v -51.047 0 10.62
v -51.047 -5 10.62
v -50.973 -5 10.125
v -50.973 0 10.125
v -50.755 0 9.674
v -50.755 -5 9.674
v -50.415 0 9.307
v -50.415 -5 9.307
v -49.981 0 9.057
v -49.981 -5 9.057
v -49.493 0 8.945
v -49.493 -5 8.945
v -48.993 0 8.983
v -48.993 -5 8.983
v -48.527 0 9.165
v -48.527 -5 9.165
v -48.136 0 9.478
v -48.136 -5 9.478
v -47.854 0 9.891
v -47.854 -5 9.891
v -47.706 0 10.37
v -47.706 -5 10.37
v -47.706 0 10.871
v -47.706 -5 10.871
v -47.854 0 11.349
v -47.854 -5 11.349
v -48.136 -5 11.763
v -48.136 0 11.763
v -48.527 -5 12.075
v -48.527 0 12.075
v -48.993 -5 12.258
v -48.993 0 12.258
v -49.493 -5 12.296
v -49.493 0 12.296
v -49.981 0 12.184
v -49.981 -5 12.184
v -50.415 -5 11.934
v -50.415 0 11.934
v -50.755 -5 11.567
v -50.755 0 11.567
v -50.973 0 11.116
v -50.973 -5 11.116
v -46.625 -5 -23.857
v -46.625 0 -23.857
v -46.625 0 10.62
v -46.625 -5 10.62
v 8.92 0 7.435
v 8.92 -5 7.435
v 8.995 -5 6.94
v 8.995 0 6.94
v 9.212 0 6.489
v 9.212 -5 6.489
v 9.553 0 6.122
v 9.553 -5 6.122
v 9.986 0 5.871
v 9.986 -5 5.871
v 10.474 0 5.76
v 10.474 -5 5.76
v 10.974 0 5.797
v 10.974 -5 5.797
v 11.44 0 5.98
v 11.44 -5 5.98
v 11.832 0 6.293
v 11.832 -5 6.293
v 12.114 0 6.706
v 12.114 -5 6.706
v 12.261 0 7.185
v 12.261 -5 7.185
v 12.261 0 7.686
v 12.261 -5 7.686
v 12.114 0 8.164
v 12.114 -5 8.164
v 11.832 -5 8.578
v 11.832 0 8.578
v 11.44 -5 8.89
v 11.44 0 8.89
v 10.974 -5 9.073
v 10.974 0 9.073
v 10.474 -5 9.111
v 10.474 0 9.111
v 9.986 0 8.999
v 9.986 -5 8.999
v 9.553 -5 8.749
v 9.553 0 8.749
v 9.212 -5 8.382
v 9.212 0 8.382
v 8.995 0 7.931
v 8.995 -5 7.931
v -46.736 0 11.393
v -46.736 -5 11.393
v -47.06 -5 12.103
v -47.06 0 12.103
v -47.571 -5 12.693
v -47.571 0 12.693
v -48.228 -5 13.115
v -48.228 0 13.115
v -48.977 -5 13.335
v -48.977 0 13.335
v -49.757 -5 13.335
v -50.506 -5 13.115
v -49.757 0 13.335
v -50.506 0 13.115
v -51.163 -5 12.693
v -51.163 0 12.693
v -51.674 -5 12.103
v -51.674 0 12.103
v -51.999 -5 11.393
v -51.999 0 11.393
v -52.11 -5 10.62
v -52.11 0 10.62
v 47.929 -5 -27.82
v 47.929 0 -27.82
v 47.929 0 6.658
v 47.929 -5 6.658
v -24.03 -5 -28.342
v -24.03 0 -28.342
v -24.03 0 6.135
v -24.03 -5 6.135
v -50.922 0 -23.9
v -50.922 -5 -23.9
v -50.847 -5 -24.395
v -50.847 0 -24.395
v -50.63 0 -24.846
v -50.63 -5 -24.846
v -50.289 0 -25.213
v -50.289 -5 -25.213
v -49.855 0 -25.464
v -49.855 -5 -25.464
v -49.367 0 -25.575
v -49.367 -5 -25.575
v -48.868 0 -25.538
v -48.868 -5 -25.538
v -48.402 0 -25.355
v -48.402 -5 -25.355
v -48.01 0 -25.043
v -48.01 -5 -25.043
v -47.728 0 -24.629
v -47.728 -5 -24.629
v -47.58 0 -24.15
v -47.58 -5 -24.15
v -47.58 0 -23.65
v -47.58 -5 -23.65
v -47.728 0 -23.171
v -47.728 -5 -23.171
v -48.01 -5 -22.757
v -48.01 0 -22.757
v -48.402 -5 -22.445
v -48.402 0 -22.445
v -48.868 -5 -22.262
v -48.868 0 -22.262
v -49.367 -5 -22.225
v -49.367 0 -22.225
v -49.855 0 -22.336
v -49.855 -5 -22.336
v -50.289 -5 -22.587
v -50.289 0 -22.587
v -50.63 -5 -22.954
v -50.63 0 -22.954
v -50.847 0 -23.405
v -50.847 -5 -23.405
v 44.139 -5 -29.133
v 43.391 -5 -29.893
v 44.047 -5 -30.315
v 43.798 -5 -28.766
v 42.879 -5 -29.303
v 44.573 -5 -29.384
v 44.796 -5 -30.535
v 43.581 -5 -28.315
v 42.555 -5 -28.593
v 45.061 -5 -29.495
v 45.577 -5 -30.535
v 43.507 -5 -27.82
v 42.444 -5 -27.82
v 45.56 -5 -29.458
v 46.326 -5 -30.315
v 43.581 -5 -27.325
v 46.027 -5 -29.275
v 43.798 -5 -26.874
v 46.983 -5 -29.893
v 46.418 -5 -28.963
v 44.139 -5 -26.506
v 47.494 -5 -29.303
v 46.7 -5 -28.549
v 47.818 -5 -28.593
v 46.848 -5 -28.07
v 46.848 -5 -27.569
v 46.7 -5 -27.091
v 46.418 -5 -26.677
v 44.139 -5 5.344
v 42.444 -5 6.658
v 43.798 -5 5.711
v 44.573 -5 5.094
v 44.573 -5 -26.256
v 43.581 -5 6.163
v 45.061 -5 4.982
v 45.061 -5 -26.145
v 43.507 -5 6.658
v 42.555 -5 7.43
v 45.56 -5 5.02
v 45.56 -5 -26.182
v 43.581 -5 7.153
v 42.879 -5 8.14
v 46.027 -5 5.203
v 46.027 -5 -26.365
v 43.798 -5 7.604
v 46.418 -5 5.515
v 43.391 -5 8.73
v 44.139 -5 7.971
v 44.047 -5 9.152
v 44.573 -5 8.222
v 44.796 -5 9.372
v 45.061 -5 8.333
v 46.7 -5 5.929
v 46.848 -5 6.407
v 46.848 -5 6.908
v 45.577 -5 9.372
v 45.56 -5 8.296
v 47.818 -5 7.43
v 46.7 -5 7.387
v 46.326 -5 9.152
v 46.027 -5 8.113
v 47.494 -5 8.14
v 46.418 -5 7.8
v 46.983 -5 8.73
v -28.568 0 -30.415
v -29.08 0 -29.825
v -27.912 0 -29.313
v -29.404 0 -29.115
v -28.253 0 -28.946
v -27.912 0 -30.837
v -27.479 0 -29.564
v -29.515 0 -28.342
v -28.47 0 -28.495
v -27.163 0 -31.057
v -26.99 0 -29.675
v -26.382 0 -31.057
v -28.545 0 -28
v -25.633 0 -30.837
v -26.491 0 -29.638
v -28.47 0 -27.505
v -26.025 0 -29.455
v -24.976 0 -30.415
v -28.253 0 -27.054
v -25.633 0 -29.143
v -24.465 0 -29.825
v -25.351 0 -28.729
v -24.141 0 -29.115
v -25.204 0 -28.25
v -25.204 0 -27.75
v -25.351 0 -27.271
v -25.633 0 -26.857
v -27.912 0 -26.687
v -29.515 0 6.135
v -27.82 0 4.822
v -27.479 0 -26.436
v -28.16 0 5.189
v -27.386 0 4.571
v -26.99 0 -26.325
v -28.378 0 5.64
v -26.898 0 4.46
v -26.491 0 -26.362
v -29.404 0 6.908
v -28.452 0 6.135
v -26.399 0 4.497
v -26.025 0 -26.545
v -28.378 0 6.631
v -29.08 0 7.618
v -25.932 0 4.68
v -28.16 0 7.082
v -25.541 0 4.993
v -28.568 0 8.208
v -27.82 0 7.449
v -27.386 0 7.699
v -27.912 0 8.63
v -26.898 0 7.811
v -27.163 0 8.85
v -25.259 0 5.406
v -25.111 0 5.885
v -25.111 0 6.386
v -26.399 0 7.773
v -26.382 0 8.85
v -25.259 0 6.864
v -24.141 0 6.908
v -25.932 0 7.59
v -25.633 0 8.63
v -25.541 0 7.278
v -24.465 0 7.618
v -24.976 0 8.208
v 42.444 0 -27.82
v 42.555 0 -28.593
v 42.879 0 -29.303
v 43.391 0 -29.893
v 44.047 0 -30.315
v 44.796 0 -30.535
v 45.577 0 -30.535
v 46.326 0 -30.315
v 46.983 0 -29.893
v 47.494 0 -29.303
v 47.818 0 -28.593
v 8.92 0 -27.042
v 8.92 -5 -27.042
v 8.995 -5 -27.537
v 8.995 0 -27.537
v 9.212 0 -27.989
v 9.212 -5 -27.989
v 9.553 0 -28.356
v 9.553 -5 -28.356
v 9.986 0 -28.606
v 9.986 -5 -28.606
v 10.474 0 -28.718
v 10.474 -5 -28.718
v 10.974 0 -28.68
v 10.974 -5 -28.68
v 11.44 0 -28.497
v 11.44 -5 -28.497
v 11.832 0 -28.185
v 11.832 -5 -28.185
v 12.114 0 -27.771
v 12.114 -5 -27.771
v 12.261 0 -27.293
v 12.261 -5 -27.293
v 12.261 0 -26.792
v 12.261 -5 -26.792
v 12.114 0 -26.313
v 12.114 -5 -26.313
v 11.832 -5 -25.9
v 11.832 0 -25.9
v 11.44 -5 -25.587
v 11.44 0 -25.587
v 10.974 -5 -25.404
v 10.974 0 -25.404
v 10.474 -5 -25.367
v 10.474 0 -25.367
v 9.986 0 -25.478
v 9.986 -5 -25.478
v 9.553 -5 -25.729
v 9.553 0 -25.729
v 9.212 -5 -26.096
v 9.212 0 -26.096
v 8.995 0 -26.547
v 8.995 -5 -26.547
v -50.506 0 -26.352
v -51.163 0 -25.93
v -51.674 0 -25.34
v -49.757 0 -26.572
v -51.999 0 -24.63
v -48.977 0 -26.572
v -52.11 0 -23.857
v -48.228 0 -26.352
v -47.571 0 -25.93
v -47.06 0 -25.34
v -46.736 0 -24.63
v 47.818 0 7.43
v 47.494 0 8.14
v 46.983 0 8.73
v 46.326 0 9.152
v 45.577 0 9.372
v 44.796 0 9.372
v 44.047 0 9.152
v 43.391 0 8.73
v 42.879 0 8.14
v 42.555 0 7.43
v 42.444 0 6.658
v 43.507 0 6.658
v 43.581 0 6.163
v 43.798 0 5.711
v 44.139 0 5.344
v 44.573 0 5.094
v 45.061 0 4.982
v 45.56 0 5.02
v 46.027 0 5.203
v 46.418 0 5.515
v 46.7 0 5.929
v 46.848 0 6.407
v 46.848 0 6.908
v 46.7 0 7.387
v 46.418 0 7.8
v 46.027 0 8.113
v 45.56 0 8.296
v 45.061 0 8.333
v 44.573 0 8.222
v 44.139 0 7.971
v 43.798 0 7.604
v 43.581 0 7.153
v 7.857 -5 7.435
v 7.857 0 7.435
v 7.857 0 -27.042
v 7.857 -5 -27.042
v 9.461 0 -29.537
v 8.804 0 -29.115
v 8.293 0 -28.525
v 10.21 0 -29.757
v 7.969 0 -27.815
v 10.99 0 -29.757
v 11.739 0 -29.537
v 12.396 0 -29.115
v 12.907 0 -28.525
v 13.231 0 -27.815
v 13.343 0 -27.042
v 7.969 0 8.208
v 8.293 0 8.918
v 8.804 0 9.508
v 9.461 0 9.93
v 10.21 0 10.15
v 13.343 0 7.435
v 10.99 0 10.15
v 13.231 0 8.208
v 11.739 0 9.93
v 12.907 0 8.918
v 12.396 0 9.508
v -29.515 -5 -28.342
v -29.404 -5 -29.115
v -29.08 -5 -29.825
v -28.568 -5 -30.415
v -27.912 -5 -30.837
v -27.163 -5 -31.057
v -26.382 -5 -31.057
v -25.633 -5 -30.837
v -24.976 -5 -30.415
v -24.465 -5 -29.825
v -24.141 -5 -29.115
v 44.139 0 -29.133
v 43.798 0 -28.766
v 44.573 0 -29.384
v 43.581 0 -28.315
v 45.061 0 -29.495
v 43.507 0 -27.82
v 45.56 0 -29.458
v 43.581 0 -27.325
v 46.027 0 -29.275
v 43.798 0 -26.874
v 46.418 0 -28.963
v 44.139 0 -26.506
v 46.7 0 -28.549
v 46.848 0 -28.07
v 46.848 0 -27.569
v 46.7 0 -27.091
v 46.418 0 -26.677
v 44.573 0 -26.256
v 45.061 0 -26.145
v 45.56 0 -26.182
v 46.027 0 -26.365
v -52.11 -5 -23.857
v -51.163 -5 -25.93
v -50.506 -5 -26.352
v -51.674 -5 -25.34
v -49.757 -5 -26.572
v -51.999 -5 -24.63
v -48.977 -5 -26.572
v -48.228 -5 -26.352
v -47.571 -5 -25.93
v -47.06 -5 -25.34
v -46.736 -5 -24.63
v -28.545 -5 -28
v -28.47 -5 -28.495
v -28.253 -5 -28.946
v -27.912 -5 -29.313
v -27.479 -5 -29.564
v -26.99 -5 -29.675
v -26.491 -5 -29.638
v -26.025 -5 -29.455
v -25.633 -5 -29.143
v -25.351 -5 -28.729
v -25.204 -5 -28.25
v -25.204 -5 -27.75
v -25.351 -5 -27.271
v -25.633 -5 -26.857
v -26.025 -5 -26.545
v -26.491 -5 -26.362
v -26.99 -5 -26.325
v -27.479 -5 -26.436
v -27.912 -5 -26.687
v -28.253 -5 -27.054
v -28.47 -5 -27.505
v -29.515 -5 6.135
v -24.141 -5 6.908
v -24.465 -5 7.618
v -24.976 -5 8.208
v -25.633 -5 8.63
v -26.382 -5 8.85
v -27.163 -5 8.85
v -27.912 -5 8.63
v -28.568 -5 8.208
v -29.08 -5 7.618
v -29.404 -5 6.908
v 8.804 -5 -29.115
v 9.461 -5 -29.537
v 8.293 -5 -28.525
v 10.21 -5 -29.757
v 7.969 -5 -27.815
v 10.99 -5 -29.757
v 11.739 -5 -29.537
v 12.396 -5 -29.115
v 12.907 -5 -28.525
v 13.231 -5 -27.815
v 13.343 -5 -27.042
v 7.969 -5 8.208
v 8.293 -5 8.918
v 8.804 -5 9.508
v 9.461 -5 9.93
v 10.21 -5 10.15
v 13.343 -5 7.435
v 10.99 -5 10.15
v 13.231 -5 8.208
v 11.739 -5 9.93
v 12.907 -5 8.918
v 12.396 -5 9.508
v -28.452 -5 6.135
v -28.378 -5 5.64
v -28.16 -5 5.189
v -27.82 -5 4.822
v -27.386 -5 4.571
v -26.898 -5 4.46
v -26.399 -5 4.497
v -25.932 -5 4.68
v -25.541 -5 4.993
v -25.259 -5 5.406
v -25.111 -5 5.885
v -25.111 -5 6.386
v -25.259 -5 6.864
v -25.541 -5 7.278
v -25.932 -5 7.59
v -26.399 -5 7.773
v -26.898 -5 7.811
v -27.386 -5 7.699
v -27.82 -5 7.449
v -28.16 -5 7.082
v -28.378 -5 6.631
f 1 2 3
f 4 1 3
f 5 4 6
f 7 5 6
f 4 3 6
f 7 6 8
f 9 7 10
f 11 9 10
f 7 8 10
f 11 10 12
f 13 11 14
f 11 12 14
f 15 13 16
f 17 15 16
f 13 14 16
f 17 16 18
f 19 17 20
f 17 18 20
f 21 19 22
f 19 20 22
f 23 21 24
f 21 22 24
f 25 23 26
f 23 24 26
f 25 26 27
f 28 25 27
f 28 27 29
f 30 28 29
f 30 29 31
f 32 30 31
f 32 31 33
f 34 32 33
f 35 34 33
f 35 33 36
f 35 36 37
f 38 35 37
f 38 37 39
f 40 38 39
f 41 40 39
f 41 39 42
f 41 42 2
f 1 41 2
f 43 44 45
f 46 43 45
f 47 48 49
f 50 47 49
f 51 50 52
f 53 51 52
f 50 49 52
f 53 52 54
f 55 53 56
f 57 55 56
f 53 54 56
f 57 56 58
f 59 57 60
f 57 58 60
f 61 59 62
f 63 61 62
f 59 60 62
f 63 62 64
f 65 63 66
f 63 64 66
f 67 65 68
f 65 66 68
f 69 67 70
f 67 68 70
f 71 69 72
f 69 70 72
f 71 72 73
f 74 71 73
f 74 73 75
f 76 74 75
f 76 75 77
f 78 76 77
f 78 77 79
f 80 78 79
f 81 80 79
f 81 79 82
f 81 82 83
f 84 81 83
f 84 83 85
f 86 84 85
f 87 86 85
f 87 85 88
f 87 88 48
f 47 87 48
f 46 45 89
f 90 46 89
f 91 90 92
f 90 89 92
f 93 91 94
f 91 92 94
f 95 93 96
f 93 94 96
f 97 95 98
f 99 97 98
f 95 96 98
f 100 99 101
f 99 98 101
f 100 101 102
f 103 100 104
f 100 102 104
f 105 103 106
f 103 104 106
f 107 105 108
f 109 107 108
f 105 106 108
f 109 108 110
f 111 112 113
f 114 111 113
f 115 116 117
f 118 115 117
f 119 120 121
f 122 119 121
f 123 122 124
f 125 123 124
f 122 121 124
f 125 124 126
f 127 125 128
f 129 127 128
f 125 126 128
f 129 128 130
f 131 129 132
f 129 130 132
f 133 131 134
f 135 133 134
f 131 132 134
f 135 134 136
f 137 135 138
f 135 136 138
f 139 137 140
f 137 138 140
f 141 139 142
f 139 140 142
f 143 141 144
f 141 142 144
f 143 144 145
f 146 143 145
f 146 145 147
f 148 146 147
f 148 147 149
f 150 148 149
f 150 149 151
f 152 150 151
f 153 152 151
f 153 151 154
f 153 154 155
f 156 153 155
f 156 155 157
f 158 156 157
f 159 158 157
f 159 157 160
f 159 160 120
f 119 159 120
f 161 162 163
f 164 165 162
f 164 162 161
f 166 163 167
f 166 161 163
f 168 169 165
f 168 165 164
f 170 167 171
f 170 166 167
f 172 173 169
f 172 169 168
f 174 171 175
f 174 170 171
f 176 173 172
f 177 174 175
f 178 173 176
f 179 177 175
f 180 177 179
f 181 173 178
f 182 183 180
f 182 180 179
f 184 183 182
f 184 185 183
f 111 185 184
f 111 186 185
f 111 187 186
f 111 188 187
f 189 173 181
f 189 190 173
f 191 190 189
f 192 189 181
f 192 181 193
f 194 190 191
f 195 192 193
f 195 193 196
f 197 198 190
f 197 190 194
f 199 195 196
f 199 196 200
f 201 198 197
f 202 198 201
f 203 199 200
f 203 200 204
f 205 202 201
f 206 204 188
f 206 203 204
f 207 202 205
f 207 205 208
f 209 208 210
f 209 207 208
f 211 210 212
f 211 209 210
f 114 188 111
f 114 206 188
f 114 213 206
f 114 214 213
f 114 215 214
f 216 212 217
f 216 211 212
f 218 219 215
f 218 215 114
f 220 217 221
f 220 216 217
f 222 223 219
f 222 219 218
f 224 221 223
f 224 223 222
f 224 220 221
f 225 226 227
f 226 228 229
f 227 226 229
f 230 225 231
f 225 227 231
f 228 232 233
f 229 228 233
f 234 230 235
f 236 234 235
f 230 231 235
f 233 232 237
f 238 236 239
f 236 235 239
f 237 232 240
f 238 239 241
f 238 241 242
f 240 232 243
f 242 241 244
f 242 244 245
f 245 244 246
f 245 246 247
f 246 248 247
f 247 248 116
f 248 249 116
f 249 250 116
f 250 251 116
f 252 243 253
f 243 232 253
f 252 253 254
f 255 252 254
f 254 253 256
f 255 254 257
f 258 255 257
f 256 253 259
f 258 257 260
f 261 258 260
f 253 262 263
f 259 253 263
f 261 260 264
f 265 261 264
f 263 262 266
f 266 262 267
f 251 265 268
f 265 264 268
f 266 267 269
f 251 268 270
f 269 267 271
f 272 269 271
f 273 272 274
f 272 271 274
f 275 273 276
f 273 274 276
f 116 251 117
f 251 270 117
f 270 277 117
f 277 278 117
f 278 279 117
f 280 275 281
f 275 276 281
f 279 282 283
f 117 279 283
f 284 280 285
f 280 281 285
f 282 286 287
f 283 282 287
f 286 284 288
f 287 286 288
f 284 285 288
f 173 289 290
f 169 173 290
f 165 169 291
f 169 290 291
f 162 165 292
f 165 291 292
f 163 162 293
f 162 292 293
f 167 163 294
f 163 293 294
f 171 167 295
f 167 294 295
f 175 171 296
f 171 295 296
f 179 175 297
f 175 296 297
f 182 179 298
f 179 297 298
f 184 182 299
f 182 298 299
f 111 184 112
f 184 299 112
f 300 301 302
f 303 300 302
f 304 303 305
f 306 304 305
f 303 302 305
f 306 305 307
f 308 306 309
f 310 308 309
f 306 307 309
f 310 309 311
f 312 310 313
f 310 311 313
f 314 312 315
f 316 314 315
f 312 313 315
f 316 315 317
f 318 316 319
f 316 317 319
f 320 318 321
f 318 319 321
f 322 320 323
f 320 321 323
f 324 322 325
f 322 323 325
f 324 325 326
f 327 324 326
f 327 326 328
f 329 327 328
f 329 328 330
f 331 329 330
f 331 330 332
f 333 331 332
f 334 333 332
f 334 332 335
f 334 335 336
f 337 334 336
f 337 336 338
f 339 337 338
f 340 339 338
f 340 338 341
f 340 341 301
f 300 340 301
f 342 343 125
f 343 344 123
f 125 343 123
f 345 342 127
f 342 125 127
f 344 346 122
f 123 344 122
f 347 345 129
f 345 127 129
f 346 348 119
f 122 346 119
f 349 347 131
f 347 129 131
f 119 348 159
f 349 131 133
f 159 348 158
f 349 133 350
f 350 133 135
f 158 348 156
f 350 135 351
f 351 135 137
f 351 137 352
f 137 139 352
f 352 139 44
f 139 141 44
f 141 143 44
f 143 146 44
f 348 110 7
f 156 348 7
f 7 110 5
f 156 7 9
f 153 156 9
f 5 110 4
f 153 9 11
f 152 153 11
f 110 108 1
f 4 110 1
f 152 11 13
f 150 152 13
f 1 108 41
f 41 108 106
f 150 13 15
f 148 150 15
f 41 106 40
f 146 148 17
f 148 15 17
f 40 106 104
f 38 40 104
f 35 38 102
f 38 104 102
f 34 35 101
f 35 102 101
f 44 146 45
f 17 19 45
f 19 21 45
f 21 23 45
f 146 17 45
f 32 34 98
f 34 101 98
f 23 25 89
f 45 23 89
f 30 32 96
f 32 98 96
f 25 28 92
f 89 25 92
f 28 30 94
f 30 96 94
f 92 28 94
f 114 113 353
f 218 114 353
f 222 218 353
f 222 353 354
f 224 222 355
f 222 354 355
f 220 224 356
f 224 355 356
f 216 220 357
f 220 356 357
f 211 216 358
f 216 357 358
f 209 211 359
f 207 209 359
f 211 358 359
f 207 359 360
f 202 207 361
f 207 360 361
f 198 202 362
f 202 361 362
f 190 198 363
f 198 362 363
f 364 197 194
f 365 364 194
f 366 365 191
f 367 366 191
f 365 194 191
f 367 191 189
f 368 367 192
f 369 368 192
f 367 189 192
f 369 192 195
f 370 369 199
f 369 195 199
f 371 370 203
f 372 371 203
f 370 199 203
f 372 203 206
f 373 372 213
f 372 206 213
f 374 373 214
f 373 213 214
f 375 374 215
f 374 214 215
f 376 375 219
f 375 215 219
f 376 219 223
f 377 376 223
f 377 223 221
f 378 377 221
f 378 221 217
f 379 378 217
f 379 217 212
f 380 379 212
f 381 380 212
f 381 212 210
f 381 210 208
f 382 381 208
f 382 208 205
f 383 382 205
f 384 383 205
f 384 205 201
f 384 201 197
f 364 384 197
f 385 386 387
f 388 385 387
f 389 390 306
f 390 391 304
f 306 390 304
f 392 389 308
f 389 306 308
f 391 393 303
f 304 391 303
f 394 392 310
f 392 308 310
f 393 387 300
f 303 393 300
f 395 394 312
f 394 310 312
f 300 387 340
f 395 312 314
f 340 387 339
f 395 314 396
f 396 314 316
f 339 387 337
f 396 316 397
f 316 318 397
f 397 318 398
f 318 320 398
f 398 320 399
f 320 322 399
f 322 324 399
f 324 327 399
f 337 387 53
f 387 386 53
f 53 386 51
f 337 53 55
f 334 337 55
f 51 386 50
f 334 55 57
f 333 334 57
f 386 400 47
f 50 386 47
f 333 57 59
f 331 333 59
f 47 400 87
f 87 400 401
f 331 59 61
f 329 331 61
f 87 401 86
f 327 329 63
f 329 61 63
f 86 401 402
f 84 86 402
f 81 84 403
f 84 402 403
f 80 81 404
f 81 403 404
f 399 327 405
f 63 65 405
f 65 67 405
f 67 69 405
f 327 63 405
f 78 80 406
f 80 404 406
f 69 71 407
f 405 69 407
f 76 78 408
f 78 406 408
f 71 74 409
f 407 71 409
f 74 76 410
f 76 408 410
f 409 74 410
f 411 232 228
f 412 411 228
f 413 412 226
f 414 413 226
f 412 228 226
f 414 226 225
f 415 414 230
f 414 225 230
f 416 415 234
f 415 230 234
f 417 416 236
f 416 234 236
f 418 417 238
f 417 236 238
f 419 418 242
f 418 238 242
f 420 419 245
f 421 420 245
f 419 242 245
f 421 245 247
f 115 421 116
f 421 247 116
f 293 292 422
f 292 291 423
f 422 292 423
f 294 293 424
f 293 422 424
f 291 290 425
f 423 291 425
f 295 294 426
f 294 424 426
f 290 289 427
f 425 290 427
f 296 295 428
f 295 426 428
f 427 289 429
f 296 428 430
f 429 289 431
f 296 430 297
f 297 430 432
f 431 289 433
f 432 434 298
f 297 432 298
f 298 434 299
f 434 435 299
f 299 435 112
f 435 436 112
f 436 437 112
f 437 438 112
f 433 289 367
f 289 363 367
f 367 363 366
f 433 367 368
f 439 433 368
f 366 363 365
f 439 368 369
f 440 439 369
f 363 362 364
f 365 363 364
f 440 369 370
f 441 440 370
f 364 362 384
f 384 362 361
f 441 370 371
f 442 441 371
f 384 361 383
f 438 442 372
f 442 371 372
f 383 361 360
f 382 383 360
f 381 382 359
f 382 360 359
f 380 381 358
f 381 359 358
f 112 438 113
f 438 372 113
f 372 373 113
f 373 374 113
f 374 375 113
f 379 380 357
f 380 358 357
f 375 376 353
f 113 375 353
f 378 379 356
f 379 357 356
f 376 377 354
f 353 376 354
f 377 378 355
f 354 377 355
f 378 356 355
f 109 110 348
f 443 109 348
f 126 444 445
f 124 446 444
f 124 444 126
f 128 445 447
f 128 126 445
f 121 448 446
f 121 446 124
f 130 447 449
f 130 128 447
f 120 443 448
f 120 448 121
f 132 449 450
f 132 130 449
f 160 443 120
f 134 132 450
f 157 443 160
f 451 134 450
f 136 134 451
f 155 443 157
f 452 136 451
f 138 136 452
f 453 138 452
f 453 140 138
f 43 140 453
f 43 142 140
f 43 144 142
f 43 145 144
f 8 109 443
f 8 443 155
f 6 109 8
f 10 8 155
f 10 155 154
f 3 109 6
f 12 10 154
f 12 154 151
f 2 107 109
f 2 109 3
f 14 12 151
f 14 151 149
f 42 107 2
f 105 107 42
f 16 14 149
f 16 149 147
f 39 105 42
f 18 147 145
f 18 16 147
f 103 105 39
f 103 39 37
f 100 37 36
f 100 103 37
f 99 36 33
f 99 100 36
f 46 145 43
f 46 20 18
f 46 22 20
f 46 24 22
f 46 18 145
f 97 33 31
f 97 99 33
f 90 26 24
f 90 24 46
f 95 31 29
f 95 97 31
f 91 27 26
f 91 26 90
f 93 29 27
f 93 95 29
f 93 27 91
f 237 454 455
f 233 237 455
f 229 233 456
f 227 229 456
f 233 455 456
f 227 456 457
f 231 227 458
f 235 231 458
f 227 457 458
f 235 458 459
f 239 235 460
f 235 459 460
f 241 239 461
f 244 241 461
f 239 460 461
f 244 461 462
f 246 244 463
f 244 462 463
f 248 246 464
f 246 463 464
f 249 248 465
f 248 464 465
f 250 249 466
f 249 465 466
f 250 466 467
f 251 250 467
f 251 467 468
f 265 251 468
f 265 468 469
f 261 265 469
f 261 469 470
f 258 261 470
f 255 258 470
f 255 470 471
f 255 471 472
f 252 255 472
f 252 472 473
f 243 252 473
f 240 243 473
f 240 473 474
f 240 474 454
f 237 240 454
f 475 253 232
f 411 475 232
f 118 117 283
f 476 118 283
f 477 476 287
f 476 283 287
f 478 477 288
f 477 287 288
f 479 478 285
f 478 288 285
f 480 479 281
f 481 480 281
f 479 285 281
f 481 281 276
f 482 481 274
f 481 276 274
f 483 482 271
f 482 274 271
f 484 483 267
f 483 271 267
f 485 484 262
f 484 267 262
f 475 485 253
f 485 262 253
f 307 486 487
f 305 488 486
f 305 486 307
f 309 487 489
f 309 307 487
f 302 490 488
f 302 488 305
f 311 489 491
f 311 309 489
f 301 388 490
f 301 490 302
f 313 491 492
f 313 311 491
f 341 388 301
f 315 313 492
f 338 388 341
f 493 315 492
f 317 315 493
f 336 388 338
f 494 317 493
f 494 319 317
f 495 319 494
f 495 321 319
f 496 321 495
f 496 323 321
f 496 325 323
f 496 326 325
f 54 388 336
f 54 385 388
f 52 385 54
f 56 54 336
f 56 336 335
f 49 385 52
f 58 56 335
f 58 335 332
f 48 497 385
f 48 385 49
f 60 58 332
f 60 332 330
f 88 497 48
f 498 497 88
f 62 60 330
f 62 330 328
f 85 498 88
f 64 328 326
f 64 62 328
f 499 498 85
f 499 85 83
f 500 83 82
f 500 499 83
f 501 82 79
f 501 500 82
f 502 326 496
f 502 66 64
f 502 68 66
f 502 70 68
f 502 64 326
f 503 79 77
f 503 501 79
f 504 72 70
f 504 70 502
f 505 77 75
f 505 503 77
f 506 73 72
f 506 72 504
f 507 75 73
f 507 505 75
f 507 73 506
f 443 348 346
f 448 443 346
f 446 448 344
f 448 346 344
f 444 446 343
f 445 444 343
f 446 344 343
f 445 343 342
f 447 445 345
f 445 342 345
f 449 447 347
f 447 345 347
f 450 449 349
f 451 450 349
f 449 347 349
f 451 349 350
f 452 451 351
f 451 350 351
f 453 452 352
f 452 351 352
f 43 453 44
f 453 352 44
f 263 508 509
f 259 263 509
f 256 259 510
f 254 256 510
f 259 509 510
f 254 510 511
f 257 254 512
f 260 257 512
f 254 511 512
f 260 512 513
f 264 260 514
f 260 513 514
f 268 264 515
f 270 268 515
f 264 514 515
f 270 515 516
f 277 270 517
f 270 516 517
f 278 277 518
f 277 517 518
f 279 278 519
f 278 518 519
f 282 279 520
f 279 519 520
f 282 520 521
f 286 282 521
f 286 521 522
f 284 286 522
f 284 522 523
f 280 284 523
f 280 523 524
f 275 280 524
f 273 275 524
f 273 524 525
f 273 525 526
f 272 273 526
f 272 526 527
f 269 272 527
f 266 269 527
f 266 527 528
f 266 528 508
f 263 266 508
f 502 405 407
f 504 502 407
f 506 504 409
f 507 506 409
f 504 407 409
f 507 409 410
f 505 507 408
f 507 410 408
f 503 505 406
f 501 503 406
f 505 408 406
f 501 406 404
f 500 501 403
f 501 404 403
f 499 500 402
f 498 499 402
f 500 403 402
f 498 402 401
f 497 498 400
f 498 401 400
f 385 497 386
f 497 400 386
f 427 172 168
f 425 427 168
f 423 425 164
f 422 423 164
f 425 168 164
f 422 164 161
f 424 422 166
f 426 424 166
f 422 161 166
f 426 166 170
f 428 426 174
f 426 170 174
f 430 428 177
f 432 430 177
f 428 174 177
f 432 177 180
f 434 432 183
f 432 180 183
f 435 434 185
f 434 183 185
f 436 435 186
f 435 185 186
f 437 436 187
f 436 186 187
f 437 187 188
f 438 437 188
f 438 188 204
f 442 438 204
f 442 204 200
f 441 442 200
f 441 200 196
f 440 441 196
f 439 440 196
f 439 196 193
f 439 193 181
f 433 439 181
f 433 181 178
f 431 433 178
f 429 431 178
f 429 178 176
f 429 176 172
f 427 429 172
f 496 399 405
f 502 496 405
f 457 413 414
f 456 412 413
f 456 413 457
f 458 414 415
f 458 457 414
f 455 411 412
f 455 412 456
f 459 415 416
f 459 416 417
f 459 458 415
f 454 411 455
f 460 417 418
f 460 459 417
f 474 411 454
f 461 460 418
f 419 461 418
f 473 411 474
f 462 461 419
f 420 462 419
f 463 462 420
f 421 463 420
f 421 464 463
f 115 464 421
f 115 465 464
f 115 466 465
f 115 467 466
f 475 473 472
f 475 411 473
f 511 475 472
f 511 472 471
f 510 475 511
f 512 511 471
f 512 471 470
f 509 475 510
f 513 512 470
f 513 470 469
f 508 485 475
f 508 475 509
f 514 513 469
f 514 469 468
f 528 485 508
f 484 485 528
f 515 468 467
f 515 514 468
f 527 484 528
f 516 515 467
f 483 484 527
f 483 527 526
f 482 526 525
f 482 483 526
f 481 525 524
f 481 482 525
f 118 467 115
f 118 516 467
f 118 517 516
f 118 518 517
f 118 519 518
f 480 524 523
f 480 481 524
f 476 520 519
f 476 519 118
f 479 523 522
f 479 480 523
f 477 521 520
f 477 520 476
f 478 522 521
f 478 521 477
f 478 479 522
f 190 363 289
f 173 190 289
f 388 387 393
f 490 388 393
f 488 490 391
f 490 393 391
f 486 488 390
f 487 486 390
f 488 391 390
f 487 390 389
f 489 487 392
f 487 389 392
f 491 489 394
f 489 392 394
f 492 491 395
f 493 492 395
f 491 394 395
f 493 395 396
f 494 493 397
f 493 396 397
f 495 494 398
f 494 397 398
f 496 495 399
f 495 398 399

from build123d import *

# Parameters (mm, degrees)
F2_DEPTH     = 5
F3_DEPTH     = 5
F4_DEPTH     = 5
F5_D         = 3.36
F5_2_D       = 3.36
F5_3_D       = 3.36
F5_4_D       = 3.36
F5_ON_F1_D   = 3.36
F5_ON_F1_2_D = 3.36


with BuildPart() as f2:
    # F0 (on Front) → F2 (new body)
    with BuildSketch(Plane.XZ):
        with BuildLine():
            ThreePointArc((-24.0298556164, 6.1353398487), (-26.7723915167, 8.877875749), (-29.514927417, 6.1353398487))
            Line((-29.514927417, 6.1353398487), (-24.0298556164, 6.1353398487))
        make_face()
        with BuildLine():
            Line((-24.0298556164, 6.1353398487), (-29.514927417, 6.1353398487))
            ThreePointArc((-29.514927417, 6.1353398487), (-26.7723915167, 3.3928039484), (-24.0298556164, 6.1353398487))
        make_face()
        with BuildLine():
            ThreePointArc((-24.0298556164, 6.1353398487), (-26.7723915167, 3.3928039484), (-29.514927417, 6.1353398487))
            Line((-29.514927417, 6.1353398487), (-29.514927417, -28.3422730863))
            ThreePointArc((-29.514927417, -28.3422730863), (-26.7723915167, -25.599737186), (-24.0298556164, -28.3422730863))
            Line((-24.0298556164, -28.3422730863), (-24.0298556164, 6.1353398487))
        make_face()
        with BuildLine():
            ThreePointArc((-24.0298556164, -28.3422730863), (-26.7723915167, -25.599737186), (-29.514927417, -28.3422730863))
            Line((-29.514927417, -28.3422730863), (-24.0298556164, -28.3422730863))
        make_face()
        with BuildLine():
            Line((-24.0298556164, -28.3422730863), (-29.514927417, -28.3422730863))
            ThreePointArc((-29.514927417, -28.3422730863), (-26.7723915167, -31.0848089866), (-24.0298556164, -28.3422730863))
        make_face()
    extrude(amount=F2_DEPTH)

    # F5 (through all)
    with Locations(Plane(origin=(0, 0, 0), x_dir=(1, 0, 0), z_dir=(0, 1, 0))):
        with Locations((45.1865680516, -6.6577275284), (45.1865680516, 27.8198854066), (10.5999996886, 27.0422715694), (10.5999996886, -7.4353413656), (-26.7723915167, -6.1353398487), (-49.3671749718, -10.6204142794)):
            Hole(F5_D / 2)

    # F5 on F1 (through all)
    with Locations(Plane(origin=(0, 0, 0), x_dir=(1, 0, 0), z_dir=(0, 1, 0))):
        with Locations((-26.8647950143, 27.9999990016), (-49.2416396737, 23.8999929279)):
            Hole(F5_ON_F1_D / 2)


with BuildPart() as f3:
    # F0 (on Front) → F3 (new body)
    with BuildSketch(Plane.XZ):
        with BuildLine():
            ThreePointArc((7.8574637882, -27.0422715694), (10.5999996886, -29.7848074697), (13.3425355889, -27.0422715694))
            ThreePointArc((13.3425355889, -27.0422715694), (10.5999996886, -24.299735669), (7.8574637882, -27.0422715694))
        make_face()
        with BuildLine():
            ThreePointArc((7.8574637882, 7.4353413656), (10.5999996886, 4.6928054653), (13.3425355889, 7.4353413656))
            ThreePointArc((13.3425355889, 7.4353413656), (10.5999996886, 10.177877266), (7.8574637882, 7.4353413656))
        make_face()
        with BuildLine():
            ThreePointArc((7.8574637882, -27.0422715694), (10.5999996886, -24.299735669), (13.3425355889, -27.0422715694))
            Line((13.3425355889, -27.0422715694), (13.3425355889, 7.4353413656))
            ThreePointArc((13.3425355889, 7.4353413656), (10.5999996886, 4.6928054653), (7.8574637882, 7.4353413656))
            Line((7.8574637882, 7.4353413656), (7.8574637882, -27.0422715694))
        make_face()
    extrude(amount=F3_DEPTH)

    # F5#2 (through all)
    with Locations(Plane(origin=(0, 0, 0), x_dir=(1, 0, 0), z_dir=(0, 1, 0))):
        with Locations((45.1865680516, -6.6577275284), (45.1865680516, 27.8198854066), (10.5999996886, 27.0422715694), (10.5999996886, -7.4353413656), (-26.7723915167, -6.1353398487), (-49.3671749718, -10.6204142794)):
            Hole(F5_2_D / 2)


with BuildPart() as f4:
    # F0 (on Front) → F4 (new body)
    with BuildSketch(Plane.XZ):
        with BuildLine():
            ThreePointArc((-52.1097108722, -23.8571986556), (-49.3671749718, -21.1146627553), (-46.6246390715, -23.8571986556))
            Line((-46.6246390715, -23.8571986556), (-46.6246390715, 10.6204142794))
            ThreePointArc((-46.6246390715, 10.6204142794), (-49.3671749718, 7.8778783791), (-52.1097108722, 10.6204142794))
            Line((-52.1097108722, 10.6204142794), (-52.1097108722, -23.8571986556))
        make_face()
        with BuildLine():
            ThreePointArc((-52.1097108722, -23.8571986556), (-49.3671749718, -26.5997345559), (-46.6246390715, -23.8571986556))
            ThreePointArc((-46.6246390715, -23.8571986556), (-49.3671749718, -21.1146627553), (-52.1097108722, -23.8571986556))
        make_face()
        with BuildLine():
            ThreePointArc((-52.1097108722, 10.6204142794), (-49.3671749718, 7.8778783791), (-46.6246390715, 10.6204142794))
            ThreePointArc((-46.6246390715, 10.6204142794), (-49.3671749718, 13.3629501797), (-52.1097108722, 10.6204142794))
        make_face()
    extrude(amount=F4_DEPTH)

    # F5#3 (through all)
    with Locations(Plane(origin=(0, 0, 0), x_dir=(1, 0, 0), z_dir=(0, 1, 0))):
        with Locations((45.1865680516, -6.6577275284), (45.1865680516, 27.8198854066), (10.5999996886, 27.0422715694), (10.5999996886, -7.4353413656), (-26.7723915167, -6.1353398487), (-49.3671749718, -10.6204142794)):
            Hole(F5_3_D / 2)

    # F5 on F1#2 (through all)
    with Locations(Plane(origin=(0, 0, 0), x_dir=(1, 0, 0), z_dir=(0, 1, 0))):
        with Locations((-26.8647950143, 27.9999990016), (-49.2416396737, 23.8999929279)):
            Hole(F5_ON_F1_2_D / 2)


with BuildPart() as f4b:
    # F0 (on Front) → F4, piece 2 (new body)
    with BuildSketch(Plane.XZ):
        with BuildLine():
            ThreePointArc((42.4440321513, -27.8198854066), (45.1865680516, -30.562421307), (47.9291039519, -27.8198854066))
            ThreePointArc((47.9291039519, -27.8198854066), (45.1865680516, -25.0773495063), (42.4440321513, -27.8198854066))
        make_face()
        with BuildLine():
            ThreePointArc((42.4440321513, 6.6577275284), (45.1865680516, 3.915191628), (47.9291039519, 6.6577275284))
            ThreePointArc((47.9291039519, 6.6577275284), (45.1865680516, 9.4002634287), (42.4440321513, 6.6577275284))
        make_face()
        with BuildLine():
            ThreePointArc((42.4440321513, -27.8198854066), (45.1865680516, -25.0773495063), (47.9291039519, -27.8198854066))
            Line((47.9291039519, -27.8198854066), (47.9291039519, 6.6577275284))
            ThreePointArc((47.9291039519, 6.6577275284), (45.1865680516, 3.915191628), (42.4440321513, 6.6577275284))
            Line((42.4440321513, 6.6577275284), (42.4440321513, -27.8198854066))
        make_face()
    extrude(amount=F4_DEPTH)

    # F5#4 (through all)
    with Locations(Plane(origin=(0, 0, 0), x_dir=(1, 0, 0), z_dir=(0, 1, 0))):
        with Locations((45.1865680516, -6.6577275284), (45.1865680516, 27.8198854066), (10.5999996886, 27.0422715694), (10.5999996886, -7.4353413656), (-26.7723915167, -6.1353398487), (-49.3671749718, -10.6204142794)):
            Hole(F5_4_D / 2)


solid = Compound([f2.part, f3.part, f4.part, f4b.part])
